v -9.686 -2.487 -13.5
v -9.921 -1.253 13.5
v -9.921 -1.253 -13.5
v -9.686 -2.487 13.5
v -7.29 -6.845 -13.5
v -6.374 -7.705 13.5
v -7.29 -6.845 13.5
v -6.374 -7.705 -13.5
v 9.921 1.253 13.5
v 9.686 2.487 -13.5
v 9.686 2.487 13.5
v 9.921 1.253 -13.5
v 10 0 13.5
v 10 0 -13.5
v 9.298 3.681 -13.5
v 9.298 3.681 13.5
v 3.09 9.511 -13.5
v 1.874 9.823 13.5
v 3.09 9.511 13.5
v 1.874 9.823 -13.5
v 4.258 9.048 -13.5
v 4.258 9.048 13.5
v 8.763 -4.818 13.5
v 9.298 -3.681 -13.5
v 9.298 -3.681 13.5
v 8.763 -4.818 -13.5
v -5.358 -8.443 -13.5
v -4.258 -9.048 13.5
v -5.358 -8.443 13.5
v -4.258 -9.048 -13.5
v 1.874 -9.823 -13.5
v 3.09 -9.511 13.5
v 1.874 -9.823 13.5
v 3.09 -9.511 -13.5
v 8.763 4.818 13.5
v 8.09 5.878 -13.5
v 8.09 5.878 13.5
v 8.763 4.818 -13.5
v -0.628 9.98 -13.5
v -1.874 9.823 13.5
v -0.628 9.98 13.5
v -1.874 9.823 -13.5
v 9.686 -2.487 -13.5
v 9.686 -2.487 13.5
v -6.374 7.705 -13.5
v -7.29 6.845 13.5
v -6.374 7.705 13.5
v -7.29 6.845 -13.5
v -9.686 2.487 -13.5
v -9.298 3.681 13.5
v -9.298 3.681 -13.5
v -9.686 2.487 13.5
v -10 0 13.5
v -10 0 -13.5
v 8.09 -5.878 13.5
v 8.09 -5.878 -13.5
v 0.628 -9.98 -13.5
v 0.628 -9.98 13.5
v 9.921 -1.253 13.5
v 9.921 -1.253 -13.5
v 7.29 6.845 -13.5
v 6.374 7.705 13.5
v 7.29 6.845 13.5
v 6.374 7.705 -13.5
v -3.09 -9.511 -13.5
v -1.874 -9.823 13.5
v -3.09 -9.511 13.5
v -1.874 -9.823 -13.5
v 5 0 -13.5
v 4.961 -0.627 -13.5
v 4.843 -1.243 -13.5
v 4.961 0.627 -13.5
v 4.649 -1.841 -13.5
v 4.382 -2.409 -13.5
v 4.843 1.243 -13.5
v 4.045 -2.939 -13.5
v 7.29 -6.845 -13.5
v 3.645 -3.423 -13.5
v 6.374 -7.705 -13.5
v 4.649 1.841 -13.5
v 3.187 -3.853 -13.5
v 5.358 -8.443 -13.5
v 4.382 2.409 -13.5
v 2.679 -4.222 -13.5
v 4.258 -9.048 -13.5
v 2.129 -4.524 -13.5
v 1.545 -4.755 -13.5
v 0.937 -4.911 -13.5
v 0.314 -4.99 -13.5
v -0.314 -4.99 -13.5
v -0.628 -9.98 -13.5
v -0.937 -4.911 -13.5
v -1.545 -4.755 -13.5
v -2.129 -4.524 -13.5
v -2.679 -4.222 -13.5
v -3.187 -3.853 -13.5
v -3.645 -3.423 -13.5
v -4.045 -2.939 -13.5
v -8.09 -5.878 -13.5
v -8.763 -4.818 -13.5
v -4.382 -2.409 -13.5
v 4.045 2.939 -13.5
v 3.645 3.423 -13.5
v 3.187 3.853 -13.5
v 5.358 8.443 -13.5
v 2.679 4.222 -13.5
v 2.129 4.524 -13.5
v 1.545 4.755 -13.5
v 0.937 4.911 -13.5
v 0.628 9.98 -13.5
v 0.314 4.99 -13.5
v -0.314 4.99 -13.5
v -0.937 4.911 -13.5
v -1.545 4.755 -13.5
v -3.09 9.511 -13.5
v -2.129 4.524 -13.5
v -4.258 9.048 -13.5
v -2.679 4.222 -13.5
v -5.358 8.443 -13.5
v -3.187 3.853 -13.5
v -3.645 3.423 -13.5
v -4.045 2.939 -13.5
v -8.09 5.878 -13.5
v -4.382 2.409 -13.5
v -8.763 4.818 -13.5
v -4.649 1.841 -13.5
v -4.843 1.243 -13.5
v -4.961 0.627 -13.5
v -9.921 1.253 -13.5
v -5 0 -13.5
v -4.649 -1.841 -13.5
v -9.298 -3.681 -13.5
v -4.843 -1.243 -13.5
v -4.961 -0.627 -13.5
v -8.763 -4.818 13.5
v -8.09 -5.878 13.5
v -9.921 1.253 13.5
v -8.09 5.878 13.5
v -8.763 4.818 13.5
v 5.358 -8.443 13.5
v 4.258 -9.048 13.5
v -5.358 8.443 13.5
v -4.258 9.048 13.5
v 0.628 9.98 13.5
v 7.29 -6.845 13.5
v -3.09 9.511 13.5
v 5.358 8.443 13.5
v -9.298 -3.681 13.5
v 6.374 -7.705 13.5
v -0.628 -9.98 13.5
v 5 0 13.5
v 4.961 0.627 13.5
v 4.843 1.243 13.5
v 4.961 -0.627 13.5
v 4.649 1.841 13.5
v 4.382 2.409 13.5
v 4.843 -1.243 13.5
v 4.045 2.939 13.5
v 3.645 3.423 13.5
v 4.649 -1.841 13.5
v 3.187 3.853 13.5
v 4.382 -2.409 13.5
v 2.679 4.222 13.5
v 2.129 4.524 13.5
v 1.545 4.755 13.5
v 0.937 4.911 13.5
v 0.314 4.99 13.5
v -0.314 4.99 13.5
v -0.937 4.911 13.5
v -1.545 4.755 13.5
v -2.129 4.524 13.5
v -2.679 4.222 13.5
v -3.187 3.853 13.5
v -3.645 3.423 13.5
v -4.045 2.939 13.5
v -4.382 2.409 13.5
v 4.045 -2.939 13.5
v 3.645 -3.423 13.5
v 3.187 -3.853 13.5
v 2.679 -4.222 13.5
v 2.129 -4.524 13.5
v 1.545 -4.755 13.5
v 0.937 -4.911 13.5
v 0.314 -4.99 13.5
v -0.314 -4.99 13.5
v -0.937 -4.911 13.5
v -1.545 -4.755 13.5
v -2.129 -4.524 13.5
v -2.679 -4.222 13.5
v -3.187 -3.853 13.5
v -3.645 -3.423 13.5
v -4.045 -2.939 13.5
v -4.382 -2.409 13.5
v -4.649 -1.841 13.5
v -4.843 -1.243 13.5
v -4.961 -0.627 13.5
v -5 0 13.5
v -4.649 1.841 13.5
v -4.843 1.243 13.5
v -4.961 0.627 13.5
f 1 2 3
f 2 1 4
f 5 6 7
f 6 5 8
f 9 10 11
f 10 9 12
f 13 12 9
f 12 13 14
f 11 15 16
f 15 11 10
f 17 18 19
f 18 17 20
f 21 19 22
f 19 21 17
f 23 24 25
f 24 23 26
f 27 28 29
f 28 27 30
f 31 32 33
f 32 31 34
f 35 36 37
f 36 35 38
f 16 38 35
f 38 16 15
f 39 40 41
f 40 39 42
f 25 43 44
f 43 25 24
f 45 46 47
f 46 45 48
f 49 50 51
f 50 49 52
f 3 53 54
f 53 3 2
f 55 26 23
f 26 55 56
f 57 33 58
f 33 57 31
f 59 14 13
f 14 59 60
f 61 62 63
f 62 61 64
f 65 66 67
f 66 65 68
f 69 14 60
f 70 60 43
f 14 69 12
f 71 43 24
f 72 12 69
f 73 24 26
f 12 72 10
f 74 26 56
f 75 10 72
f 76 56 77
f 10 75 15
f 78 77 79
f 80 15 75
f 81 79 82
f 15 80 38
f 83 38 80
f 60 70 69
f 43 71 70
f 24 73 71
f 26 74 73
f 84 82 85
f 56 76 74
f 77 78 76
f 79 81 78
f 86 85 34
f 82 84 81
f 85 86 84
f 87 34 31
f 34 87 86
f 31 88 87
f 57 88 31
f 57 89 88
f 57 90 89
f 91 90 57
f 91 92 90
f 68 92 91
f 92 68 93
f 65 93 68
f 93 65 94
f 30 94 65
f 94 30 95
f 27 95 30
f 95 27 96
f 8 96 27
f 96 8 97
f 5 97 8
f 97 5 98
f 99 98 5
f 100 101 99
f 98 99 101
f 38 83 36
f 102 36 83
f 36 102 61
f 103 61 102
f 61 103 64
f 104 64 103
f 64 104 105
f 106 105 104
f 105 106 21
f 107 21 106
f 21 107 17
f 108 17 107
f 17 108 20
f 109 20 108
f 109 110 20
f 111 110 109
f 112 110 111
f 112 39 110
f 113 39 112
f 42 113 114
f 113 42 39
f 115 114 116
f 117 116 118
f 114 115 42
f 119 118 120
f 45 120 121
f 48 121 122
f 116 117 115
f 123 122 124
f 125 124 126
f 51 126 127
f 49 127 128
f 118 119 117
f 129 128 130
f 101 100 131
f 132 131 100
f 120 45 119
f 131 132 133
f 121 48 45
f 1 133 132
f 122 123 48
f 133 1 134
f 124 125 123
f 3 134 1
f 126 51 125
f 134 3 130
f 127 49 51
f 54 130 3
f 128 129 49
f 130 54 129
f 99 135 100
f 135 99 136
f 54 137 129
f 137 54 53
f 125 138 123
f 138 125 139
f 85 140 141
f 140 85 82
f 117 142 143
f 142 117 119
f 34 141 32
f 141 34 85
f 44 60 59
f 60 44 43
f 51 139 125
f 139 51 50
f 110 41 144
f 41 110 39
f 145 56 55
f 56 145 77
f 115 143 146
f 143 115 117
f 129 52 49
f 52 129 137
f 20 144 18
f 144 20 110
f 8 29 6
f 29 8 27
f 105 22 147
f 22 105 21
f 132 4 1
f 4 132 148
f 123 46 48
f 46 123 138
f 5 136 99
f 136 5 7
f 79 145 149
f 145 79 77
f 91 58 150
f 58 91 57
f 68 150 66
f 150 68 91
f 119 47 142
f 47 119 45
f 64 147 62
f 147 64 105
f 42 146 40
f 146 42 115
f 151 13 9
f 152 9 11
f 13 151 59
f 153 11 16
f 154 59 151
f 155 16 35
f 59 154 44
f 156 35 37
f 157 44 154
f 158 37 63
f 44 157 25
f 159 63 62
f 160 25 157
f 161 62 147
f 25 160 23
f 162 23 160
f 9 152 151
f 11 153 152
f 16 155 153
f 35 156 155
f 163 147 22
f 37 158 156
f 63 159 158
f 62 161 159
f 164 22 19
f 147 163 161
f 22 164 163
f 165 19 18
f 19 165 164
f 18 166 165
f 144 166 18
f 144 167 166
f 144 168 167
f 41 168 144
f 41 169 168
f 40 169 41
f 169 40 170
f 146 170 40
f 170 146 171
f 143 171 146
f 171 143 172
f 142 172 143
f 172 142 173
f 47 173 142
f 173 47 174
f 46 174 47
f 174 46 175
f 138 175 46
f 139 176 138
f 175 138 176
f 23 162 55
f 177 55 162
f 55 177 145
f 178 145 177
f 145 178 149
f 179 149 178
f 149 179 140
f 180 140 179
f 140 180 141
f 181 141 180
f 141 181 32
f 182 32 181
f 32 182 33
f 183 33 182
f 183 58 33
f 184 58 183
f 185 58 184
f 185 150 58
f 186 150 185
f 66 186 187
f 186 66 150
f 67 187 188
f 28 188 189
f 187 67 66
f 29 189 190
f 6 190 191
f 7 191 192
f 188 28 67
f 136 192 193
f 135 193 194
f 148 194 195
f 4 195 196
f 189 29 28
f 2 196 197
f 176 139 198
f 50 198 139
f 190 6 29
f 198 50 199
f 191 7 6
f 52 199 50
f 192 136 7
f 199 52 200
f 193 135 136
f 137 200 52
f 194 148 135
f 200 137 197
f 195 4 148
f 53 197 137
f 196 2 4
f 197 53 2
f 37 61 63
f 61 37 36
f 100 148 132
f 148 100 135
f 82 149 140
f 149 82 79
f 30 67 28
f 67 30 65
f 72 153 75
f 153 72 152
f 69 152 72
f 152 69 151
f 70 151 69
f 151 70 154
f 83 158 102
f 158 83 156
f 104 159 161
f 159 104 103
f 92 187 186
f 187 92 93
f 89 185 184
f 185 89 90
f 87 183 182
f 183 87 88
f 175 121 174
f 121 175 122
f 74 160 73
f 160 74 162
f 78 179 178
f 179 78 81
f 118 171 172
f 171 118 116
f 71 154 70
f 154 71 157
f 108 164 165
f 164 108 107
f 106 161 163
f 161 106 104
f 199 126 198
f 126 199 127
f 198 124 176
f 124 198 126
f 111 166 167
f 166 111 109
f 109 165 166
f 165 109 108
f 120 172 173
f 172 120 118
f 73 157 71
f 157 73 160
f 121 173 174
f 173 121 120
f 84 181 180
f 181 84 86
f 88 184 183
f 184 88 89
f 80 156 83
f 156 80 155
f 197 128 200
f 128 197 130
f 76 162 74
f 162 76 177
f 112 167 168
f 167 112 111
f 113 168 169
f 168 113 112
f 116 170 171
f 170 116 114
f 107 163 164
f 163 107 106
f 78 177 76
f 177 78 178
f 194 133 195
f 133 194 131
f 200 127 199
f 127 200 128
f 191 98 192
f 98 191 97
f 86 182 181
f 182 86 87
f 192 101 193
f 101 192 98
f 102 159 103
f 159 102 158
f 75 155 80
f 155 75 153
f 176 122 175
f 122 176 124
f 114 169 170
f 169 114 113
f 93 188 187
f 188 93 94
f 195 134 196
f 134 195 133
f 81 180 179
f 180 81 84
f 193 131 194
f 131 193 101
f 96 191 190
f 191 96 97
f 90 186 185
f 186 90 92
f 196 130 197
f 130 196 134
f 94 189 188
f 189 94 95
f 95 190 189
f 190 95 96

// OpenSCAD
$fn = 50;


difference() {
	union() {
		translate(v = [0, 0, -13.5000000000]) {
			cylinder(h = 27, r = 10.0000000000);
		}
	}
	union() {
		translate(v = [0, 0, -100.0000000000]) {
			cylinder(h = 200, r = 5.0000000000);
		}
	}
}
